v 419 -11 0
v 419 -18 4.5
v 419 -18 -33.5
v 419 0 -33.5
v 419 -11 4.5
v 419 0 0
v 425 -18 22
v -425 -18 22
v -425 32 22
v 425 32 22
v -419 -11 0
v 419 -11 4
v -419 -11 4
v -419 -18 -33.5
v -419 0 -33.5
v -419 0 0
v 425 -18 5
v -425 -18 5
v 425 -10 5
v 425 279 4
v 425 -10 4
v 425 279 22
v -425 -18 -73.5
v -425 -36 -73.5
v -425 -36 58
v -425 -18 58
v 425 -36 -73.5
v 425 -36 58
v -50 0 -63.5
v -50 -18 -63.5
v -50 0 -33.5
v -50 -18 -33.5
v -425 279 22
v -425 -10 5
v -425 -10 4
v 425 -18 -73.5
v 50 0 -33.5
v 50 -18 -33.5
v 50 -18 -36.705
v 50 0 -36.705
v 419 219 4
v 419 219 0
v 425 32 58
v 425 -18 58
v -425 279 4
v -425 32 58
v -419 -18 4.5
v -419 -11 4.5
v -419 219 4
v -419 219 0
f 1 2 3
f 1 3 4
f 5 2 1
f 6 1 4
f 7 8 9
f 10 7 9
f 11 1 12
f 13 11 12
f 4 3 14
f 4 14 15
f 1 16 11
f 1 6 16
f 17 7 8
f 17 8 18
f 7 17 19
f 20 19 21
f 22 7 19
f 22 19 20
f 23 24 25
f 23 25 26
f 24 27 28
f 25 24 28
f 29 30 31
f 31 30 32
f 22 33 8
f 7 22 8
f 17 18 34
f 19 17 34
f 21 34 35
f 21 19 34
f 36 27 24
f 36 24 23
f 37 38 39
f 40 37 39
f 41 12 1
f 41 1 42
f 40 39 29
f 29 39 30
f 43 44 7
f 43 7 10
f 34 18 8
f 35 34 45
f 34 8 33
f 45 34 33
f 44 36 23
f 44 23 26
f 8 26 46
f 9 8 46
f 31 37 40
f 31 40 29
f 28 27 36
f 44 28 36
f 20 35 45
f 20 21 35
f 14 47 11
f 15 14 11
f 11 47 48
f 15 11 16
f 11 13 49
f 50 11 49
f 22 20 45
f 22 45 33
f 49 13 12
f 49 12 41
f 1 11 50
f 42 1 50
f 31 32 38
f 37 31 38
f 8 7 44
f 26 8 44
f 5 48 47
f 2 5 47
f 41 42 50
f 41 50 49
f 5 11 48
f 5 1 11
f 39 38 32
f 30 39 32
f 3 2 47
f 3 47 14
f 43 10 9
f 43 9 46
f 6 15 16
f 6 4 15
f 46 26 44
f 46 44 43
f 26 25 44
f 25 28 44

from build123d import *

# Parameters (mm, degrees)
F7_DEPTH  = 425
F3_W      = 50
F3_H      = 36
F4_W      = 18
F4_H      = 131.5
F0_W      = 230
F0_H      = 4
F8_DEPTH  = 419
F10_DEPTH = 18


with BuildPart() as f7:
    # F2 (on Right) → F7 (new body, symmetric)
    with BuildSketch(Plane.YZ):
        Polygon((-10, 4), (279, 4), (279, 22), (-18, 22), (-18, 5), (-10, 5), align=None)
    extrude(amount=F7_DEPTH, both=True)


with BuildPart() as f7b:
    # F3 (on Right) → F7, piece 2 (new body, symmetric)
    with BuildSketch(Plane.YZ):
        with Locations((7, 40)):
            Rectangle(F3_W, F3_H)
    extrude(amount=F7_DEPTH, both=True)


with BuildPart() as f7c:
    # F4 (on Right) → F7, piece 3 (new body, symmetric)
    with BuildSketch(Plane.YZ):
        with Locations((-27, -7.75)):
            Rectangle(F4_W, F4_H)
    extrude(amount=F7_DEPTH, both=True)


with BuildPart() as f8:
    # F0 (on Right) → F8 (new body, symmetric)
    with BuildSketch(Plane.YZ):
        with Locations((104, 2)):
            Rectangle(F0_W, F0_H)
    extrude(amount=F8_DEPTH, both=True)


with BuildPart() as f8b:
    # F1 (on Right) → F8, piece 2 (new body, symmetric)
    with BuildSketch(Plane.YZ):
        Polygon((-11, 0), (-11, 4.5), (-18, 4.5), (-18, -33.5), (0, -33.5), (0, 0), align=None)
    extrude(amount=F8_DEPTH, both=True)


with BuildPart() as f10:
    # F9 (on face) → F10 (new body)
    with BuildSketch(Plane(origin=(0, -18, 0), x_dir=(-1, 0, 0), z_dir=(0, 1, 0))):
        Polygon((50, -33.5), (-50, -33.5), (-50, -36.7050807569), (50, -63.5), align=None)
    extrude(amount=F10_DEPTH)


solid = Compound([f7.part, f7b.part, f7c.part, f8.part, f8b.part, f10.part])
